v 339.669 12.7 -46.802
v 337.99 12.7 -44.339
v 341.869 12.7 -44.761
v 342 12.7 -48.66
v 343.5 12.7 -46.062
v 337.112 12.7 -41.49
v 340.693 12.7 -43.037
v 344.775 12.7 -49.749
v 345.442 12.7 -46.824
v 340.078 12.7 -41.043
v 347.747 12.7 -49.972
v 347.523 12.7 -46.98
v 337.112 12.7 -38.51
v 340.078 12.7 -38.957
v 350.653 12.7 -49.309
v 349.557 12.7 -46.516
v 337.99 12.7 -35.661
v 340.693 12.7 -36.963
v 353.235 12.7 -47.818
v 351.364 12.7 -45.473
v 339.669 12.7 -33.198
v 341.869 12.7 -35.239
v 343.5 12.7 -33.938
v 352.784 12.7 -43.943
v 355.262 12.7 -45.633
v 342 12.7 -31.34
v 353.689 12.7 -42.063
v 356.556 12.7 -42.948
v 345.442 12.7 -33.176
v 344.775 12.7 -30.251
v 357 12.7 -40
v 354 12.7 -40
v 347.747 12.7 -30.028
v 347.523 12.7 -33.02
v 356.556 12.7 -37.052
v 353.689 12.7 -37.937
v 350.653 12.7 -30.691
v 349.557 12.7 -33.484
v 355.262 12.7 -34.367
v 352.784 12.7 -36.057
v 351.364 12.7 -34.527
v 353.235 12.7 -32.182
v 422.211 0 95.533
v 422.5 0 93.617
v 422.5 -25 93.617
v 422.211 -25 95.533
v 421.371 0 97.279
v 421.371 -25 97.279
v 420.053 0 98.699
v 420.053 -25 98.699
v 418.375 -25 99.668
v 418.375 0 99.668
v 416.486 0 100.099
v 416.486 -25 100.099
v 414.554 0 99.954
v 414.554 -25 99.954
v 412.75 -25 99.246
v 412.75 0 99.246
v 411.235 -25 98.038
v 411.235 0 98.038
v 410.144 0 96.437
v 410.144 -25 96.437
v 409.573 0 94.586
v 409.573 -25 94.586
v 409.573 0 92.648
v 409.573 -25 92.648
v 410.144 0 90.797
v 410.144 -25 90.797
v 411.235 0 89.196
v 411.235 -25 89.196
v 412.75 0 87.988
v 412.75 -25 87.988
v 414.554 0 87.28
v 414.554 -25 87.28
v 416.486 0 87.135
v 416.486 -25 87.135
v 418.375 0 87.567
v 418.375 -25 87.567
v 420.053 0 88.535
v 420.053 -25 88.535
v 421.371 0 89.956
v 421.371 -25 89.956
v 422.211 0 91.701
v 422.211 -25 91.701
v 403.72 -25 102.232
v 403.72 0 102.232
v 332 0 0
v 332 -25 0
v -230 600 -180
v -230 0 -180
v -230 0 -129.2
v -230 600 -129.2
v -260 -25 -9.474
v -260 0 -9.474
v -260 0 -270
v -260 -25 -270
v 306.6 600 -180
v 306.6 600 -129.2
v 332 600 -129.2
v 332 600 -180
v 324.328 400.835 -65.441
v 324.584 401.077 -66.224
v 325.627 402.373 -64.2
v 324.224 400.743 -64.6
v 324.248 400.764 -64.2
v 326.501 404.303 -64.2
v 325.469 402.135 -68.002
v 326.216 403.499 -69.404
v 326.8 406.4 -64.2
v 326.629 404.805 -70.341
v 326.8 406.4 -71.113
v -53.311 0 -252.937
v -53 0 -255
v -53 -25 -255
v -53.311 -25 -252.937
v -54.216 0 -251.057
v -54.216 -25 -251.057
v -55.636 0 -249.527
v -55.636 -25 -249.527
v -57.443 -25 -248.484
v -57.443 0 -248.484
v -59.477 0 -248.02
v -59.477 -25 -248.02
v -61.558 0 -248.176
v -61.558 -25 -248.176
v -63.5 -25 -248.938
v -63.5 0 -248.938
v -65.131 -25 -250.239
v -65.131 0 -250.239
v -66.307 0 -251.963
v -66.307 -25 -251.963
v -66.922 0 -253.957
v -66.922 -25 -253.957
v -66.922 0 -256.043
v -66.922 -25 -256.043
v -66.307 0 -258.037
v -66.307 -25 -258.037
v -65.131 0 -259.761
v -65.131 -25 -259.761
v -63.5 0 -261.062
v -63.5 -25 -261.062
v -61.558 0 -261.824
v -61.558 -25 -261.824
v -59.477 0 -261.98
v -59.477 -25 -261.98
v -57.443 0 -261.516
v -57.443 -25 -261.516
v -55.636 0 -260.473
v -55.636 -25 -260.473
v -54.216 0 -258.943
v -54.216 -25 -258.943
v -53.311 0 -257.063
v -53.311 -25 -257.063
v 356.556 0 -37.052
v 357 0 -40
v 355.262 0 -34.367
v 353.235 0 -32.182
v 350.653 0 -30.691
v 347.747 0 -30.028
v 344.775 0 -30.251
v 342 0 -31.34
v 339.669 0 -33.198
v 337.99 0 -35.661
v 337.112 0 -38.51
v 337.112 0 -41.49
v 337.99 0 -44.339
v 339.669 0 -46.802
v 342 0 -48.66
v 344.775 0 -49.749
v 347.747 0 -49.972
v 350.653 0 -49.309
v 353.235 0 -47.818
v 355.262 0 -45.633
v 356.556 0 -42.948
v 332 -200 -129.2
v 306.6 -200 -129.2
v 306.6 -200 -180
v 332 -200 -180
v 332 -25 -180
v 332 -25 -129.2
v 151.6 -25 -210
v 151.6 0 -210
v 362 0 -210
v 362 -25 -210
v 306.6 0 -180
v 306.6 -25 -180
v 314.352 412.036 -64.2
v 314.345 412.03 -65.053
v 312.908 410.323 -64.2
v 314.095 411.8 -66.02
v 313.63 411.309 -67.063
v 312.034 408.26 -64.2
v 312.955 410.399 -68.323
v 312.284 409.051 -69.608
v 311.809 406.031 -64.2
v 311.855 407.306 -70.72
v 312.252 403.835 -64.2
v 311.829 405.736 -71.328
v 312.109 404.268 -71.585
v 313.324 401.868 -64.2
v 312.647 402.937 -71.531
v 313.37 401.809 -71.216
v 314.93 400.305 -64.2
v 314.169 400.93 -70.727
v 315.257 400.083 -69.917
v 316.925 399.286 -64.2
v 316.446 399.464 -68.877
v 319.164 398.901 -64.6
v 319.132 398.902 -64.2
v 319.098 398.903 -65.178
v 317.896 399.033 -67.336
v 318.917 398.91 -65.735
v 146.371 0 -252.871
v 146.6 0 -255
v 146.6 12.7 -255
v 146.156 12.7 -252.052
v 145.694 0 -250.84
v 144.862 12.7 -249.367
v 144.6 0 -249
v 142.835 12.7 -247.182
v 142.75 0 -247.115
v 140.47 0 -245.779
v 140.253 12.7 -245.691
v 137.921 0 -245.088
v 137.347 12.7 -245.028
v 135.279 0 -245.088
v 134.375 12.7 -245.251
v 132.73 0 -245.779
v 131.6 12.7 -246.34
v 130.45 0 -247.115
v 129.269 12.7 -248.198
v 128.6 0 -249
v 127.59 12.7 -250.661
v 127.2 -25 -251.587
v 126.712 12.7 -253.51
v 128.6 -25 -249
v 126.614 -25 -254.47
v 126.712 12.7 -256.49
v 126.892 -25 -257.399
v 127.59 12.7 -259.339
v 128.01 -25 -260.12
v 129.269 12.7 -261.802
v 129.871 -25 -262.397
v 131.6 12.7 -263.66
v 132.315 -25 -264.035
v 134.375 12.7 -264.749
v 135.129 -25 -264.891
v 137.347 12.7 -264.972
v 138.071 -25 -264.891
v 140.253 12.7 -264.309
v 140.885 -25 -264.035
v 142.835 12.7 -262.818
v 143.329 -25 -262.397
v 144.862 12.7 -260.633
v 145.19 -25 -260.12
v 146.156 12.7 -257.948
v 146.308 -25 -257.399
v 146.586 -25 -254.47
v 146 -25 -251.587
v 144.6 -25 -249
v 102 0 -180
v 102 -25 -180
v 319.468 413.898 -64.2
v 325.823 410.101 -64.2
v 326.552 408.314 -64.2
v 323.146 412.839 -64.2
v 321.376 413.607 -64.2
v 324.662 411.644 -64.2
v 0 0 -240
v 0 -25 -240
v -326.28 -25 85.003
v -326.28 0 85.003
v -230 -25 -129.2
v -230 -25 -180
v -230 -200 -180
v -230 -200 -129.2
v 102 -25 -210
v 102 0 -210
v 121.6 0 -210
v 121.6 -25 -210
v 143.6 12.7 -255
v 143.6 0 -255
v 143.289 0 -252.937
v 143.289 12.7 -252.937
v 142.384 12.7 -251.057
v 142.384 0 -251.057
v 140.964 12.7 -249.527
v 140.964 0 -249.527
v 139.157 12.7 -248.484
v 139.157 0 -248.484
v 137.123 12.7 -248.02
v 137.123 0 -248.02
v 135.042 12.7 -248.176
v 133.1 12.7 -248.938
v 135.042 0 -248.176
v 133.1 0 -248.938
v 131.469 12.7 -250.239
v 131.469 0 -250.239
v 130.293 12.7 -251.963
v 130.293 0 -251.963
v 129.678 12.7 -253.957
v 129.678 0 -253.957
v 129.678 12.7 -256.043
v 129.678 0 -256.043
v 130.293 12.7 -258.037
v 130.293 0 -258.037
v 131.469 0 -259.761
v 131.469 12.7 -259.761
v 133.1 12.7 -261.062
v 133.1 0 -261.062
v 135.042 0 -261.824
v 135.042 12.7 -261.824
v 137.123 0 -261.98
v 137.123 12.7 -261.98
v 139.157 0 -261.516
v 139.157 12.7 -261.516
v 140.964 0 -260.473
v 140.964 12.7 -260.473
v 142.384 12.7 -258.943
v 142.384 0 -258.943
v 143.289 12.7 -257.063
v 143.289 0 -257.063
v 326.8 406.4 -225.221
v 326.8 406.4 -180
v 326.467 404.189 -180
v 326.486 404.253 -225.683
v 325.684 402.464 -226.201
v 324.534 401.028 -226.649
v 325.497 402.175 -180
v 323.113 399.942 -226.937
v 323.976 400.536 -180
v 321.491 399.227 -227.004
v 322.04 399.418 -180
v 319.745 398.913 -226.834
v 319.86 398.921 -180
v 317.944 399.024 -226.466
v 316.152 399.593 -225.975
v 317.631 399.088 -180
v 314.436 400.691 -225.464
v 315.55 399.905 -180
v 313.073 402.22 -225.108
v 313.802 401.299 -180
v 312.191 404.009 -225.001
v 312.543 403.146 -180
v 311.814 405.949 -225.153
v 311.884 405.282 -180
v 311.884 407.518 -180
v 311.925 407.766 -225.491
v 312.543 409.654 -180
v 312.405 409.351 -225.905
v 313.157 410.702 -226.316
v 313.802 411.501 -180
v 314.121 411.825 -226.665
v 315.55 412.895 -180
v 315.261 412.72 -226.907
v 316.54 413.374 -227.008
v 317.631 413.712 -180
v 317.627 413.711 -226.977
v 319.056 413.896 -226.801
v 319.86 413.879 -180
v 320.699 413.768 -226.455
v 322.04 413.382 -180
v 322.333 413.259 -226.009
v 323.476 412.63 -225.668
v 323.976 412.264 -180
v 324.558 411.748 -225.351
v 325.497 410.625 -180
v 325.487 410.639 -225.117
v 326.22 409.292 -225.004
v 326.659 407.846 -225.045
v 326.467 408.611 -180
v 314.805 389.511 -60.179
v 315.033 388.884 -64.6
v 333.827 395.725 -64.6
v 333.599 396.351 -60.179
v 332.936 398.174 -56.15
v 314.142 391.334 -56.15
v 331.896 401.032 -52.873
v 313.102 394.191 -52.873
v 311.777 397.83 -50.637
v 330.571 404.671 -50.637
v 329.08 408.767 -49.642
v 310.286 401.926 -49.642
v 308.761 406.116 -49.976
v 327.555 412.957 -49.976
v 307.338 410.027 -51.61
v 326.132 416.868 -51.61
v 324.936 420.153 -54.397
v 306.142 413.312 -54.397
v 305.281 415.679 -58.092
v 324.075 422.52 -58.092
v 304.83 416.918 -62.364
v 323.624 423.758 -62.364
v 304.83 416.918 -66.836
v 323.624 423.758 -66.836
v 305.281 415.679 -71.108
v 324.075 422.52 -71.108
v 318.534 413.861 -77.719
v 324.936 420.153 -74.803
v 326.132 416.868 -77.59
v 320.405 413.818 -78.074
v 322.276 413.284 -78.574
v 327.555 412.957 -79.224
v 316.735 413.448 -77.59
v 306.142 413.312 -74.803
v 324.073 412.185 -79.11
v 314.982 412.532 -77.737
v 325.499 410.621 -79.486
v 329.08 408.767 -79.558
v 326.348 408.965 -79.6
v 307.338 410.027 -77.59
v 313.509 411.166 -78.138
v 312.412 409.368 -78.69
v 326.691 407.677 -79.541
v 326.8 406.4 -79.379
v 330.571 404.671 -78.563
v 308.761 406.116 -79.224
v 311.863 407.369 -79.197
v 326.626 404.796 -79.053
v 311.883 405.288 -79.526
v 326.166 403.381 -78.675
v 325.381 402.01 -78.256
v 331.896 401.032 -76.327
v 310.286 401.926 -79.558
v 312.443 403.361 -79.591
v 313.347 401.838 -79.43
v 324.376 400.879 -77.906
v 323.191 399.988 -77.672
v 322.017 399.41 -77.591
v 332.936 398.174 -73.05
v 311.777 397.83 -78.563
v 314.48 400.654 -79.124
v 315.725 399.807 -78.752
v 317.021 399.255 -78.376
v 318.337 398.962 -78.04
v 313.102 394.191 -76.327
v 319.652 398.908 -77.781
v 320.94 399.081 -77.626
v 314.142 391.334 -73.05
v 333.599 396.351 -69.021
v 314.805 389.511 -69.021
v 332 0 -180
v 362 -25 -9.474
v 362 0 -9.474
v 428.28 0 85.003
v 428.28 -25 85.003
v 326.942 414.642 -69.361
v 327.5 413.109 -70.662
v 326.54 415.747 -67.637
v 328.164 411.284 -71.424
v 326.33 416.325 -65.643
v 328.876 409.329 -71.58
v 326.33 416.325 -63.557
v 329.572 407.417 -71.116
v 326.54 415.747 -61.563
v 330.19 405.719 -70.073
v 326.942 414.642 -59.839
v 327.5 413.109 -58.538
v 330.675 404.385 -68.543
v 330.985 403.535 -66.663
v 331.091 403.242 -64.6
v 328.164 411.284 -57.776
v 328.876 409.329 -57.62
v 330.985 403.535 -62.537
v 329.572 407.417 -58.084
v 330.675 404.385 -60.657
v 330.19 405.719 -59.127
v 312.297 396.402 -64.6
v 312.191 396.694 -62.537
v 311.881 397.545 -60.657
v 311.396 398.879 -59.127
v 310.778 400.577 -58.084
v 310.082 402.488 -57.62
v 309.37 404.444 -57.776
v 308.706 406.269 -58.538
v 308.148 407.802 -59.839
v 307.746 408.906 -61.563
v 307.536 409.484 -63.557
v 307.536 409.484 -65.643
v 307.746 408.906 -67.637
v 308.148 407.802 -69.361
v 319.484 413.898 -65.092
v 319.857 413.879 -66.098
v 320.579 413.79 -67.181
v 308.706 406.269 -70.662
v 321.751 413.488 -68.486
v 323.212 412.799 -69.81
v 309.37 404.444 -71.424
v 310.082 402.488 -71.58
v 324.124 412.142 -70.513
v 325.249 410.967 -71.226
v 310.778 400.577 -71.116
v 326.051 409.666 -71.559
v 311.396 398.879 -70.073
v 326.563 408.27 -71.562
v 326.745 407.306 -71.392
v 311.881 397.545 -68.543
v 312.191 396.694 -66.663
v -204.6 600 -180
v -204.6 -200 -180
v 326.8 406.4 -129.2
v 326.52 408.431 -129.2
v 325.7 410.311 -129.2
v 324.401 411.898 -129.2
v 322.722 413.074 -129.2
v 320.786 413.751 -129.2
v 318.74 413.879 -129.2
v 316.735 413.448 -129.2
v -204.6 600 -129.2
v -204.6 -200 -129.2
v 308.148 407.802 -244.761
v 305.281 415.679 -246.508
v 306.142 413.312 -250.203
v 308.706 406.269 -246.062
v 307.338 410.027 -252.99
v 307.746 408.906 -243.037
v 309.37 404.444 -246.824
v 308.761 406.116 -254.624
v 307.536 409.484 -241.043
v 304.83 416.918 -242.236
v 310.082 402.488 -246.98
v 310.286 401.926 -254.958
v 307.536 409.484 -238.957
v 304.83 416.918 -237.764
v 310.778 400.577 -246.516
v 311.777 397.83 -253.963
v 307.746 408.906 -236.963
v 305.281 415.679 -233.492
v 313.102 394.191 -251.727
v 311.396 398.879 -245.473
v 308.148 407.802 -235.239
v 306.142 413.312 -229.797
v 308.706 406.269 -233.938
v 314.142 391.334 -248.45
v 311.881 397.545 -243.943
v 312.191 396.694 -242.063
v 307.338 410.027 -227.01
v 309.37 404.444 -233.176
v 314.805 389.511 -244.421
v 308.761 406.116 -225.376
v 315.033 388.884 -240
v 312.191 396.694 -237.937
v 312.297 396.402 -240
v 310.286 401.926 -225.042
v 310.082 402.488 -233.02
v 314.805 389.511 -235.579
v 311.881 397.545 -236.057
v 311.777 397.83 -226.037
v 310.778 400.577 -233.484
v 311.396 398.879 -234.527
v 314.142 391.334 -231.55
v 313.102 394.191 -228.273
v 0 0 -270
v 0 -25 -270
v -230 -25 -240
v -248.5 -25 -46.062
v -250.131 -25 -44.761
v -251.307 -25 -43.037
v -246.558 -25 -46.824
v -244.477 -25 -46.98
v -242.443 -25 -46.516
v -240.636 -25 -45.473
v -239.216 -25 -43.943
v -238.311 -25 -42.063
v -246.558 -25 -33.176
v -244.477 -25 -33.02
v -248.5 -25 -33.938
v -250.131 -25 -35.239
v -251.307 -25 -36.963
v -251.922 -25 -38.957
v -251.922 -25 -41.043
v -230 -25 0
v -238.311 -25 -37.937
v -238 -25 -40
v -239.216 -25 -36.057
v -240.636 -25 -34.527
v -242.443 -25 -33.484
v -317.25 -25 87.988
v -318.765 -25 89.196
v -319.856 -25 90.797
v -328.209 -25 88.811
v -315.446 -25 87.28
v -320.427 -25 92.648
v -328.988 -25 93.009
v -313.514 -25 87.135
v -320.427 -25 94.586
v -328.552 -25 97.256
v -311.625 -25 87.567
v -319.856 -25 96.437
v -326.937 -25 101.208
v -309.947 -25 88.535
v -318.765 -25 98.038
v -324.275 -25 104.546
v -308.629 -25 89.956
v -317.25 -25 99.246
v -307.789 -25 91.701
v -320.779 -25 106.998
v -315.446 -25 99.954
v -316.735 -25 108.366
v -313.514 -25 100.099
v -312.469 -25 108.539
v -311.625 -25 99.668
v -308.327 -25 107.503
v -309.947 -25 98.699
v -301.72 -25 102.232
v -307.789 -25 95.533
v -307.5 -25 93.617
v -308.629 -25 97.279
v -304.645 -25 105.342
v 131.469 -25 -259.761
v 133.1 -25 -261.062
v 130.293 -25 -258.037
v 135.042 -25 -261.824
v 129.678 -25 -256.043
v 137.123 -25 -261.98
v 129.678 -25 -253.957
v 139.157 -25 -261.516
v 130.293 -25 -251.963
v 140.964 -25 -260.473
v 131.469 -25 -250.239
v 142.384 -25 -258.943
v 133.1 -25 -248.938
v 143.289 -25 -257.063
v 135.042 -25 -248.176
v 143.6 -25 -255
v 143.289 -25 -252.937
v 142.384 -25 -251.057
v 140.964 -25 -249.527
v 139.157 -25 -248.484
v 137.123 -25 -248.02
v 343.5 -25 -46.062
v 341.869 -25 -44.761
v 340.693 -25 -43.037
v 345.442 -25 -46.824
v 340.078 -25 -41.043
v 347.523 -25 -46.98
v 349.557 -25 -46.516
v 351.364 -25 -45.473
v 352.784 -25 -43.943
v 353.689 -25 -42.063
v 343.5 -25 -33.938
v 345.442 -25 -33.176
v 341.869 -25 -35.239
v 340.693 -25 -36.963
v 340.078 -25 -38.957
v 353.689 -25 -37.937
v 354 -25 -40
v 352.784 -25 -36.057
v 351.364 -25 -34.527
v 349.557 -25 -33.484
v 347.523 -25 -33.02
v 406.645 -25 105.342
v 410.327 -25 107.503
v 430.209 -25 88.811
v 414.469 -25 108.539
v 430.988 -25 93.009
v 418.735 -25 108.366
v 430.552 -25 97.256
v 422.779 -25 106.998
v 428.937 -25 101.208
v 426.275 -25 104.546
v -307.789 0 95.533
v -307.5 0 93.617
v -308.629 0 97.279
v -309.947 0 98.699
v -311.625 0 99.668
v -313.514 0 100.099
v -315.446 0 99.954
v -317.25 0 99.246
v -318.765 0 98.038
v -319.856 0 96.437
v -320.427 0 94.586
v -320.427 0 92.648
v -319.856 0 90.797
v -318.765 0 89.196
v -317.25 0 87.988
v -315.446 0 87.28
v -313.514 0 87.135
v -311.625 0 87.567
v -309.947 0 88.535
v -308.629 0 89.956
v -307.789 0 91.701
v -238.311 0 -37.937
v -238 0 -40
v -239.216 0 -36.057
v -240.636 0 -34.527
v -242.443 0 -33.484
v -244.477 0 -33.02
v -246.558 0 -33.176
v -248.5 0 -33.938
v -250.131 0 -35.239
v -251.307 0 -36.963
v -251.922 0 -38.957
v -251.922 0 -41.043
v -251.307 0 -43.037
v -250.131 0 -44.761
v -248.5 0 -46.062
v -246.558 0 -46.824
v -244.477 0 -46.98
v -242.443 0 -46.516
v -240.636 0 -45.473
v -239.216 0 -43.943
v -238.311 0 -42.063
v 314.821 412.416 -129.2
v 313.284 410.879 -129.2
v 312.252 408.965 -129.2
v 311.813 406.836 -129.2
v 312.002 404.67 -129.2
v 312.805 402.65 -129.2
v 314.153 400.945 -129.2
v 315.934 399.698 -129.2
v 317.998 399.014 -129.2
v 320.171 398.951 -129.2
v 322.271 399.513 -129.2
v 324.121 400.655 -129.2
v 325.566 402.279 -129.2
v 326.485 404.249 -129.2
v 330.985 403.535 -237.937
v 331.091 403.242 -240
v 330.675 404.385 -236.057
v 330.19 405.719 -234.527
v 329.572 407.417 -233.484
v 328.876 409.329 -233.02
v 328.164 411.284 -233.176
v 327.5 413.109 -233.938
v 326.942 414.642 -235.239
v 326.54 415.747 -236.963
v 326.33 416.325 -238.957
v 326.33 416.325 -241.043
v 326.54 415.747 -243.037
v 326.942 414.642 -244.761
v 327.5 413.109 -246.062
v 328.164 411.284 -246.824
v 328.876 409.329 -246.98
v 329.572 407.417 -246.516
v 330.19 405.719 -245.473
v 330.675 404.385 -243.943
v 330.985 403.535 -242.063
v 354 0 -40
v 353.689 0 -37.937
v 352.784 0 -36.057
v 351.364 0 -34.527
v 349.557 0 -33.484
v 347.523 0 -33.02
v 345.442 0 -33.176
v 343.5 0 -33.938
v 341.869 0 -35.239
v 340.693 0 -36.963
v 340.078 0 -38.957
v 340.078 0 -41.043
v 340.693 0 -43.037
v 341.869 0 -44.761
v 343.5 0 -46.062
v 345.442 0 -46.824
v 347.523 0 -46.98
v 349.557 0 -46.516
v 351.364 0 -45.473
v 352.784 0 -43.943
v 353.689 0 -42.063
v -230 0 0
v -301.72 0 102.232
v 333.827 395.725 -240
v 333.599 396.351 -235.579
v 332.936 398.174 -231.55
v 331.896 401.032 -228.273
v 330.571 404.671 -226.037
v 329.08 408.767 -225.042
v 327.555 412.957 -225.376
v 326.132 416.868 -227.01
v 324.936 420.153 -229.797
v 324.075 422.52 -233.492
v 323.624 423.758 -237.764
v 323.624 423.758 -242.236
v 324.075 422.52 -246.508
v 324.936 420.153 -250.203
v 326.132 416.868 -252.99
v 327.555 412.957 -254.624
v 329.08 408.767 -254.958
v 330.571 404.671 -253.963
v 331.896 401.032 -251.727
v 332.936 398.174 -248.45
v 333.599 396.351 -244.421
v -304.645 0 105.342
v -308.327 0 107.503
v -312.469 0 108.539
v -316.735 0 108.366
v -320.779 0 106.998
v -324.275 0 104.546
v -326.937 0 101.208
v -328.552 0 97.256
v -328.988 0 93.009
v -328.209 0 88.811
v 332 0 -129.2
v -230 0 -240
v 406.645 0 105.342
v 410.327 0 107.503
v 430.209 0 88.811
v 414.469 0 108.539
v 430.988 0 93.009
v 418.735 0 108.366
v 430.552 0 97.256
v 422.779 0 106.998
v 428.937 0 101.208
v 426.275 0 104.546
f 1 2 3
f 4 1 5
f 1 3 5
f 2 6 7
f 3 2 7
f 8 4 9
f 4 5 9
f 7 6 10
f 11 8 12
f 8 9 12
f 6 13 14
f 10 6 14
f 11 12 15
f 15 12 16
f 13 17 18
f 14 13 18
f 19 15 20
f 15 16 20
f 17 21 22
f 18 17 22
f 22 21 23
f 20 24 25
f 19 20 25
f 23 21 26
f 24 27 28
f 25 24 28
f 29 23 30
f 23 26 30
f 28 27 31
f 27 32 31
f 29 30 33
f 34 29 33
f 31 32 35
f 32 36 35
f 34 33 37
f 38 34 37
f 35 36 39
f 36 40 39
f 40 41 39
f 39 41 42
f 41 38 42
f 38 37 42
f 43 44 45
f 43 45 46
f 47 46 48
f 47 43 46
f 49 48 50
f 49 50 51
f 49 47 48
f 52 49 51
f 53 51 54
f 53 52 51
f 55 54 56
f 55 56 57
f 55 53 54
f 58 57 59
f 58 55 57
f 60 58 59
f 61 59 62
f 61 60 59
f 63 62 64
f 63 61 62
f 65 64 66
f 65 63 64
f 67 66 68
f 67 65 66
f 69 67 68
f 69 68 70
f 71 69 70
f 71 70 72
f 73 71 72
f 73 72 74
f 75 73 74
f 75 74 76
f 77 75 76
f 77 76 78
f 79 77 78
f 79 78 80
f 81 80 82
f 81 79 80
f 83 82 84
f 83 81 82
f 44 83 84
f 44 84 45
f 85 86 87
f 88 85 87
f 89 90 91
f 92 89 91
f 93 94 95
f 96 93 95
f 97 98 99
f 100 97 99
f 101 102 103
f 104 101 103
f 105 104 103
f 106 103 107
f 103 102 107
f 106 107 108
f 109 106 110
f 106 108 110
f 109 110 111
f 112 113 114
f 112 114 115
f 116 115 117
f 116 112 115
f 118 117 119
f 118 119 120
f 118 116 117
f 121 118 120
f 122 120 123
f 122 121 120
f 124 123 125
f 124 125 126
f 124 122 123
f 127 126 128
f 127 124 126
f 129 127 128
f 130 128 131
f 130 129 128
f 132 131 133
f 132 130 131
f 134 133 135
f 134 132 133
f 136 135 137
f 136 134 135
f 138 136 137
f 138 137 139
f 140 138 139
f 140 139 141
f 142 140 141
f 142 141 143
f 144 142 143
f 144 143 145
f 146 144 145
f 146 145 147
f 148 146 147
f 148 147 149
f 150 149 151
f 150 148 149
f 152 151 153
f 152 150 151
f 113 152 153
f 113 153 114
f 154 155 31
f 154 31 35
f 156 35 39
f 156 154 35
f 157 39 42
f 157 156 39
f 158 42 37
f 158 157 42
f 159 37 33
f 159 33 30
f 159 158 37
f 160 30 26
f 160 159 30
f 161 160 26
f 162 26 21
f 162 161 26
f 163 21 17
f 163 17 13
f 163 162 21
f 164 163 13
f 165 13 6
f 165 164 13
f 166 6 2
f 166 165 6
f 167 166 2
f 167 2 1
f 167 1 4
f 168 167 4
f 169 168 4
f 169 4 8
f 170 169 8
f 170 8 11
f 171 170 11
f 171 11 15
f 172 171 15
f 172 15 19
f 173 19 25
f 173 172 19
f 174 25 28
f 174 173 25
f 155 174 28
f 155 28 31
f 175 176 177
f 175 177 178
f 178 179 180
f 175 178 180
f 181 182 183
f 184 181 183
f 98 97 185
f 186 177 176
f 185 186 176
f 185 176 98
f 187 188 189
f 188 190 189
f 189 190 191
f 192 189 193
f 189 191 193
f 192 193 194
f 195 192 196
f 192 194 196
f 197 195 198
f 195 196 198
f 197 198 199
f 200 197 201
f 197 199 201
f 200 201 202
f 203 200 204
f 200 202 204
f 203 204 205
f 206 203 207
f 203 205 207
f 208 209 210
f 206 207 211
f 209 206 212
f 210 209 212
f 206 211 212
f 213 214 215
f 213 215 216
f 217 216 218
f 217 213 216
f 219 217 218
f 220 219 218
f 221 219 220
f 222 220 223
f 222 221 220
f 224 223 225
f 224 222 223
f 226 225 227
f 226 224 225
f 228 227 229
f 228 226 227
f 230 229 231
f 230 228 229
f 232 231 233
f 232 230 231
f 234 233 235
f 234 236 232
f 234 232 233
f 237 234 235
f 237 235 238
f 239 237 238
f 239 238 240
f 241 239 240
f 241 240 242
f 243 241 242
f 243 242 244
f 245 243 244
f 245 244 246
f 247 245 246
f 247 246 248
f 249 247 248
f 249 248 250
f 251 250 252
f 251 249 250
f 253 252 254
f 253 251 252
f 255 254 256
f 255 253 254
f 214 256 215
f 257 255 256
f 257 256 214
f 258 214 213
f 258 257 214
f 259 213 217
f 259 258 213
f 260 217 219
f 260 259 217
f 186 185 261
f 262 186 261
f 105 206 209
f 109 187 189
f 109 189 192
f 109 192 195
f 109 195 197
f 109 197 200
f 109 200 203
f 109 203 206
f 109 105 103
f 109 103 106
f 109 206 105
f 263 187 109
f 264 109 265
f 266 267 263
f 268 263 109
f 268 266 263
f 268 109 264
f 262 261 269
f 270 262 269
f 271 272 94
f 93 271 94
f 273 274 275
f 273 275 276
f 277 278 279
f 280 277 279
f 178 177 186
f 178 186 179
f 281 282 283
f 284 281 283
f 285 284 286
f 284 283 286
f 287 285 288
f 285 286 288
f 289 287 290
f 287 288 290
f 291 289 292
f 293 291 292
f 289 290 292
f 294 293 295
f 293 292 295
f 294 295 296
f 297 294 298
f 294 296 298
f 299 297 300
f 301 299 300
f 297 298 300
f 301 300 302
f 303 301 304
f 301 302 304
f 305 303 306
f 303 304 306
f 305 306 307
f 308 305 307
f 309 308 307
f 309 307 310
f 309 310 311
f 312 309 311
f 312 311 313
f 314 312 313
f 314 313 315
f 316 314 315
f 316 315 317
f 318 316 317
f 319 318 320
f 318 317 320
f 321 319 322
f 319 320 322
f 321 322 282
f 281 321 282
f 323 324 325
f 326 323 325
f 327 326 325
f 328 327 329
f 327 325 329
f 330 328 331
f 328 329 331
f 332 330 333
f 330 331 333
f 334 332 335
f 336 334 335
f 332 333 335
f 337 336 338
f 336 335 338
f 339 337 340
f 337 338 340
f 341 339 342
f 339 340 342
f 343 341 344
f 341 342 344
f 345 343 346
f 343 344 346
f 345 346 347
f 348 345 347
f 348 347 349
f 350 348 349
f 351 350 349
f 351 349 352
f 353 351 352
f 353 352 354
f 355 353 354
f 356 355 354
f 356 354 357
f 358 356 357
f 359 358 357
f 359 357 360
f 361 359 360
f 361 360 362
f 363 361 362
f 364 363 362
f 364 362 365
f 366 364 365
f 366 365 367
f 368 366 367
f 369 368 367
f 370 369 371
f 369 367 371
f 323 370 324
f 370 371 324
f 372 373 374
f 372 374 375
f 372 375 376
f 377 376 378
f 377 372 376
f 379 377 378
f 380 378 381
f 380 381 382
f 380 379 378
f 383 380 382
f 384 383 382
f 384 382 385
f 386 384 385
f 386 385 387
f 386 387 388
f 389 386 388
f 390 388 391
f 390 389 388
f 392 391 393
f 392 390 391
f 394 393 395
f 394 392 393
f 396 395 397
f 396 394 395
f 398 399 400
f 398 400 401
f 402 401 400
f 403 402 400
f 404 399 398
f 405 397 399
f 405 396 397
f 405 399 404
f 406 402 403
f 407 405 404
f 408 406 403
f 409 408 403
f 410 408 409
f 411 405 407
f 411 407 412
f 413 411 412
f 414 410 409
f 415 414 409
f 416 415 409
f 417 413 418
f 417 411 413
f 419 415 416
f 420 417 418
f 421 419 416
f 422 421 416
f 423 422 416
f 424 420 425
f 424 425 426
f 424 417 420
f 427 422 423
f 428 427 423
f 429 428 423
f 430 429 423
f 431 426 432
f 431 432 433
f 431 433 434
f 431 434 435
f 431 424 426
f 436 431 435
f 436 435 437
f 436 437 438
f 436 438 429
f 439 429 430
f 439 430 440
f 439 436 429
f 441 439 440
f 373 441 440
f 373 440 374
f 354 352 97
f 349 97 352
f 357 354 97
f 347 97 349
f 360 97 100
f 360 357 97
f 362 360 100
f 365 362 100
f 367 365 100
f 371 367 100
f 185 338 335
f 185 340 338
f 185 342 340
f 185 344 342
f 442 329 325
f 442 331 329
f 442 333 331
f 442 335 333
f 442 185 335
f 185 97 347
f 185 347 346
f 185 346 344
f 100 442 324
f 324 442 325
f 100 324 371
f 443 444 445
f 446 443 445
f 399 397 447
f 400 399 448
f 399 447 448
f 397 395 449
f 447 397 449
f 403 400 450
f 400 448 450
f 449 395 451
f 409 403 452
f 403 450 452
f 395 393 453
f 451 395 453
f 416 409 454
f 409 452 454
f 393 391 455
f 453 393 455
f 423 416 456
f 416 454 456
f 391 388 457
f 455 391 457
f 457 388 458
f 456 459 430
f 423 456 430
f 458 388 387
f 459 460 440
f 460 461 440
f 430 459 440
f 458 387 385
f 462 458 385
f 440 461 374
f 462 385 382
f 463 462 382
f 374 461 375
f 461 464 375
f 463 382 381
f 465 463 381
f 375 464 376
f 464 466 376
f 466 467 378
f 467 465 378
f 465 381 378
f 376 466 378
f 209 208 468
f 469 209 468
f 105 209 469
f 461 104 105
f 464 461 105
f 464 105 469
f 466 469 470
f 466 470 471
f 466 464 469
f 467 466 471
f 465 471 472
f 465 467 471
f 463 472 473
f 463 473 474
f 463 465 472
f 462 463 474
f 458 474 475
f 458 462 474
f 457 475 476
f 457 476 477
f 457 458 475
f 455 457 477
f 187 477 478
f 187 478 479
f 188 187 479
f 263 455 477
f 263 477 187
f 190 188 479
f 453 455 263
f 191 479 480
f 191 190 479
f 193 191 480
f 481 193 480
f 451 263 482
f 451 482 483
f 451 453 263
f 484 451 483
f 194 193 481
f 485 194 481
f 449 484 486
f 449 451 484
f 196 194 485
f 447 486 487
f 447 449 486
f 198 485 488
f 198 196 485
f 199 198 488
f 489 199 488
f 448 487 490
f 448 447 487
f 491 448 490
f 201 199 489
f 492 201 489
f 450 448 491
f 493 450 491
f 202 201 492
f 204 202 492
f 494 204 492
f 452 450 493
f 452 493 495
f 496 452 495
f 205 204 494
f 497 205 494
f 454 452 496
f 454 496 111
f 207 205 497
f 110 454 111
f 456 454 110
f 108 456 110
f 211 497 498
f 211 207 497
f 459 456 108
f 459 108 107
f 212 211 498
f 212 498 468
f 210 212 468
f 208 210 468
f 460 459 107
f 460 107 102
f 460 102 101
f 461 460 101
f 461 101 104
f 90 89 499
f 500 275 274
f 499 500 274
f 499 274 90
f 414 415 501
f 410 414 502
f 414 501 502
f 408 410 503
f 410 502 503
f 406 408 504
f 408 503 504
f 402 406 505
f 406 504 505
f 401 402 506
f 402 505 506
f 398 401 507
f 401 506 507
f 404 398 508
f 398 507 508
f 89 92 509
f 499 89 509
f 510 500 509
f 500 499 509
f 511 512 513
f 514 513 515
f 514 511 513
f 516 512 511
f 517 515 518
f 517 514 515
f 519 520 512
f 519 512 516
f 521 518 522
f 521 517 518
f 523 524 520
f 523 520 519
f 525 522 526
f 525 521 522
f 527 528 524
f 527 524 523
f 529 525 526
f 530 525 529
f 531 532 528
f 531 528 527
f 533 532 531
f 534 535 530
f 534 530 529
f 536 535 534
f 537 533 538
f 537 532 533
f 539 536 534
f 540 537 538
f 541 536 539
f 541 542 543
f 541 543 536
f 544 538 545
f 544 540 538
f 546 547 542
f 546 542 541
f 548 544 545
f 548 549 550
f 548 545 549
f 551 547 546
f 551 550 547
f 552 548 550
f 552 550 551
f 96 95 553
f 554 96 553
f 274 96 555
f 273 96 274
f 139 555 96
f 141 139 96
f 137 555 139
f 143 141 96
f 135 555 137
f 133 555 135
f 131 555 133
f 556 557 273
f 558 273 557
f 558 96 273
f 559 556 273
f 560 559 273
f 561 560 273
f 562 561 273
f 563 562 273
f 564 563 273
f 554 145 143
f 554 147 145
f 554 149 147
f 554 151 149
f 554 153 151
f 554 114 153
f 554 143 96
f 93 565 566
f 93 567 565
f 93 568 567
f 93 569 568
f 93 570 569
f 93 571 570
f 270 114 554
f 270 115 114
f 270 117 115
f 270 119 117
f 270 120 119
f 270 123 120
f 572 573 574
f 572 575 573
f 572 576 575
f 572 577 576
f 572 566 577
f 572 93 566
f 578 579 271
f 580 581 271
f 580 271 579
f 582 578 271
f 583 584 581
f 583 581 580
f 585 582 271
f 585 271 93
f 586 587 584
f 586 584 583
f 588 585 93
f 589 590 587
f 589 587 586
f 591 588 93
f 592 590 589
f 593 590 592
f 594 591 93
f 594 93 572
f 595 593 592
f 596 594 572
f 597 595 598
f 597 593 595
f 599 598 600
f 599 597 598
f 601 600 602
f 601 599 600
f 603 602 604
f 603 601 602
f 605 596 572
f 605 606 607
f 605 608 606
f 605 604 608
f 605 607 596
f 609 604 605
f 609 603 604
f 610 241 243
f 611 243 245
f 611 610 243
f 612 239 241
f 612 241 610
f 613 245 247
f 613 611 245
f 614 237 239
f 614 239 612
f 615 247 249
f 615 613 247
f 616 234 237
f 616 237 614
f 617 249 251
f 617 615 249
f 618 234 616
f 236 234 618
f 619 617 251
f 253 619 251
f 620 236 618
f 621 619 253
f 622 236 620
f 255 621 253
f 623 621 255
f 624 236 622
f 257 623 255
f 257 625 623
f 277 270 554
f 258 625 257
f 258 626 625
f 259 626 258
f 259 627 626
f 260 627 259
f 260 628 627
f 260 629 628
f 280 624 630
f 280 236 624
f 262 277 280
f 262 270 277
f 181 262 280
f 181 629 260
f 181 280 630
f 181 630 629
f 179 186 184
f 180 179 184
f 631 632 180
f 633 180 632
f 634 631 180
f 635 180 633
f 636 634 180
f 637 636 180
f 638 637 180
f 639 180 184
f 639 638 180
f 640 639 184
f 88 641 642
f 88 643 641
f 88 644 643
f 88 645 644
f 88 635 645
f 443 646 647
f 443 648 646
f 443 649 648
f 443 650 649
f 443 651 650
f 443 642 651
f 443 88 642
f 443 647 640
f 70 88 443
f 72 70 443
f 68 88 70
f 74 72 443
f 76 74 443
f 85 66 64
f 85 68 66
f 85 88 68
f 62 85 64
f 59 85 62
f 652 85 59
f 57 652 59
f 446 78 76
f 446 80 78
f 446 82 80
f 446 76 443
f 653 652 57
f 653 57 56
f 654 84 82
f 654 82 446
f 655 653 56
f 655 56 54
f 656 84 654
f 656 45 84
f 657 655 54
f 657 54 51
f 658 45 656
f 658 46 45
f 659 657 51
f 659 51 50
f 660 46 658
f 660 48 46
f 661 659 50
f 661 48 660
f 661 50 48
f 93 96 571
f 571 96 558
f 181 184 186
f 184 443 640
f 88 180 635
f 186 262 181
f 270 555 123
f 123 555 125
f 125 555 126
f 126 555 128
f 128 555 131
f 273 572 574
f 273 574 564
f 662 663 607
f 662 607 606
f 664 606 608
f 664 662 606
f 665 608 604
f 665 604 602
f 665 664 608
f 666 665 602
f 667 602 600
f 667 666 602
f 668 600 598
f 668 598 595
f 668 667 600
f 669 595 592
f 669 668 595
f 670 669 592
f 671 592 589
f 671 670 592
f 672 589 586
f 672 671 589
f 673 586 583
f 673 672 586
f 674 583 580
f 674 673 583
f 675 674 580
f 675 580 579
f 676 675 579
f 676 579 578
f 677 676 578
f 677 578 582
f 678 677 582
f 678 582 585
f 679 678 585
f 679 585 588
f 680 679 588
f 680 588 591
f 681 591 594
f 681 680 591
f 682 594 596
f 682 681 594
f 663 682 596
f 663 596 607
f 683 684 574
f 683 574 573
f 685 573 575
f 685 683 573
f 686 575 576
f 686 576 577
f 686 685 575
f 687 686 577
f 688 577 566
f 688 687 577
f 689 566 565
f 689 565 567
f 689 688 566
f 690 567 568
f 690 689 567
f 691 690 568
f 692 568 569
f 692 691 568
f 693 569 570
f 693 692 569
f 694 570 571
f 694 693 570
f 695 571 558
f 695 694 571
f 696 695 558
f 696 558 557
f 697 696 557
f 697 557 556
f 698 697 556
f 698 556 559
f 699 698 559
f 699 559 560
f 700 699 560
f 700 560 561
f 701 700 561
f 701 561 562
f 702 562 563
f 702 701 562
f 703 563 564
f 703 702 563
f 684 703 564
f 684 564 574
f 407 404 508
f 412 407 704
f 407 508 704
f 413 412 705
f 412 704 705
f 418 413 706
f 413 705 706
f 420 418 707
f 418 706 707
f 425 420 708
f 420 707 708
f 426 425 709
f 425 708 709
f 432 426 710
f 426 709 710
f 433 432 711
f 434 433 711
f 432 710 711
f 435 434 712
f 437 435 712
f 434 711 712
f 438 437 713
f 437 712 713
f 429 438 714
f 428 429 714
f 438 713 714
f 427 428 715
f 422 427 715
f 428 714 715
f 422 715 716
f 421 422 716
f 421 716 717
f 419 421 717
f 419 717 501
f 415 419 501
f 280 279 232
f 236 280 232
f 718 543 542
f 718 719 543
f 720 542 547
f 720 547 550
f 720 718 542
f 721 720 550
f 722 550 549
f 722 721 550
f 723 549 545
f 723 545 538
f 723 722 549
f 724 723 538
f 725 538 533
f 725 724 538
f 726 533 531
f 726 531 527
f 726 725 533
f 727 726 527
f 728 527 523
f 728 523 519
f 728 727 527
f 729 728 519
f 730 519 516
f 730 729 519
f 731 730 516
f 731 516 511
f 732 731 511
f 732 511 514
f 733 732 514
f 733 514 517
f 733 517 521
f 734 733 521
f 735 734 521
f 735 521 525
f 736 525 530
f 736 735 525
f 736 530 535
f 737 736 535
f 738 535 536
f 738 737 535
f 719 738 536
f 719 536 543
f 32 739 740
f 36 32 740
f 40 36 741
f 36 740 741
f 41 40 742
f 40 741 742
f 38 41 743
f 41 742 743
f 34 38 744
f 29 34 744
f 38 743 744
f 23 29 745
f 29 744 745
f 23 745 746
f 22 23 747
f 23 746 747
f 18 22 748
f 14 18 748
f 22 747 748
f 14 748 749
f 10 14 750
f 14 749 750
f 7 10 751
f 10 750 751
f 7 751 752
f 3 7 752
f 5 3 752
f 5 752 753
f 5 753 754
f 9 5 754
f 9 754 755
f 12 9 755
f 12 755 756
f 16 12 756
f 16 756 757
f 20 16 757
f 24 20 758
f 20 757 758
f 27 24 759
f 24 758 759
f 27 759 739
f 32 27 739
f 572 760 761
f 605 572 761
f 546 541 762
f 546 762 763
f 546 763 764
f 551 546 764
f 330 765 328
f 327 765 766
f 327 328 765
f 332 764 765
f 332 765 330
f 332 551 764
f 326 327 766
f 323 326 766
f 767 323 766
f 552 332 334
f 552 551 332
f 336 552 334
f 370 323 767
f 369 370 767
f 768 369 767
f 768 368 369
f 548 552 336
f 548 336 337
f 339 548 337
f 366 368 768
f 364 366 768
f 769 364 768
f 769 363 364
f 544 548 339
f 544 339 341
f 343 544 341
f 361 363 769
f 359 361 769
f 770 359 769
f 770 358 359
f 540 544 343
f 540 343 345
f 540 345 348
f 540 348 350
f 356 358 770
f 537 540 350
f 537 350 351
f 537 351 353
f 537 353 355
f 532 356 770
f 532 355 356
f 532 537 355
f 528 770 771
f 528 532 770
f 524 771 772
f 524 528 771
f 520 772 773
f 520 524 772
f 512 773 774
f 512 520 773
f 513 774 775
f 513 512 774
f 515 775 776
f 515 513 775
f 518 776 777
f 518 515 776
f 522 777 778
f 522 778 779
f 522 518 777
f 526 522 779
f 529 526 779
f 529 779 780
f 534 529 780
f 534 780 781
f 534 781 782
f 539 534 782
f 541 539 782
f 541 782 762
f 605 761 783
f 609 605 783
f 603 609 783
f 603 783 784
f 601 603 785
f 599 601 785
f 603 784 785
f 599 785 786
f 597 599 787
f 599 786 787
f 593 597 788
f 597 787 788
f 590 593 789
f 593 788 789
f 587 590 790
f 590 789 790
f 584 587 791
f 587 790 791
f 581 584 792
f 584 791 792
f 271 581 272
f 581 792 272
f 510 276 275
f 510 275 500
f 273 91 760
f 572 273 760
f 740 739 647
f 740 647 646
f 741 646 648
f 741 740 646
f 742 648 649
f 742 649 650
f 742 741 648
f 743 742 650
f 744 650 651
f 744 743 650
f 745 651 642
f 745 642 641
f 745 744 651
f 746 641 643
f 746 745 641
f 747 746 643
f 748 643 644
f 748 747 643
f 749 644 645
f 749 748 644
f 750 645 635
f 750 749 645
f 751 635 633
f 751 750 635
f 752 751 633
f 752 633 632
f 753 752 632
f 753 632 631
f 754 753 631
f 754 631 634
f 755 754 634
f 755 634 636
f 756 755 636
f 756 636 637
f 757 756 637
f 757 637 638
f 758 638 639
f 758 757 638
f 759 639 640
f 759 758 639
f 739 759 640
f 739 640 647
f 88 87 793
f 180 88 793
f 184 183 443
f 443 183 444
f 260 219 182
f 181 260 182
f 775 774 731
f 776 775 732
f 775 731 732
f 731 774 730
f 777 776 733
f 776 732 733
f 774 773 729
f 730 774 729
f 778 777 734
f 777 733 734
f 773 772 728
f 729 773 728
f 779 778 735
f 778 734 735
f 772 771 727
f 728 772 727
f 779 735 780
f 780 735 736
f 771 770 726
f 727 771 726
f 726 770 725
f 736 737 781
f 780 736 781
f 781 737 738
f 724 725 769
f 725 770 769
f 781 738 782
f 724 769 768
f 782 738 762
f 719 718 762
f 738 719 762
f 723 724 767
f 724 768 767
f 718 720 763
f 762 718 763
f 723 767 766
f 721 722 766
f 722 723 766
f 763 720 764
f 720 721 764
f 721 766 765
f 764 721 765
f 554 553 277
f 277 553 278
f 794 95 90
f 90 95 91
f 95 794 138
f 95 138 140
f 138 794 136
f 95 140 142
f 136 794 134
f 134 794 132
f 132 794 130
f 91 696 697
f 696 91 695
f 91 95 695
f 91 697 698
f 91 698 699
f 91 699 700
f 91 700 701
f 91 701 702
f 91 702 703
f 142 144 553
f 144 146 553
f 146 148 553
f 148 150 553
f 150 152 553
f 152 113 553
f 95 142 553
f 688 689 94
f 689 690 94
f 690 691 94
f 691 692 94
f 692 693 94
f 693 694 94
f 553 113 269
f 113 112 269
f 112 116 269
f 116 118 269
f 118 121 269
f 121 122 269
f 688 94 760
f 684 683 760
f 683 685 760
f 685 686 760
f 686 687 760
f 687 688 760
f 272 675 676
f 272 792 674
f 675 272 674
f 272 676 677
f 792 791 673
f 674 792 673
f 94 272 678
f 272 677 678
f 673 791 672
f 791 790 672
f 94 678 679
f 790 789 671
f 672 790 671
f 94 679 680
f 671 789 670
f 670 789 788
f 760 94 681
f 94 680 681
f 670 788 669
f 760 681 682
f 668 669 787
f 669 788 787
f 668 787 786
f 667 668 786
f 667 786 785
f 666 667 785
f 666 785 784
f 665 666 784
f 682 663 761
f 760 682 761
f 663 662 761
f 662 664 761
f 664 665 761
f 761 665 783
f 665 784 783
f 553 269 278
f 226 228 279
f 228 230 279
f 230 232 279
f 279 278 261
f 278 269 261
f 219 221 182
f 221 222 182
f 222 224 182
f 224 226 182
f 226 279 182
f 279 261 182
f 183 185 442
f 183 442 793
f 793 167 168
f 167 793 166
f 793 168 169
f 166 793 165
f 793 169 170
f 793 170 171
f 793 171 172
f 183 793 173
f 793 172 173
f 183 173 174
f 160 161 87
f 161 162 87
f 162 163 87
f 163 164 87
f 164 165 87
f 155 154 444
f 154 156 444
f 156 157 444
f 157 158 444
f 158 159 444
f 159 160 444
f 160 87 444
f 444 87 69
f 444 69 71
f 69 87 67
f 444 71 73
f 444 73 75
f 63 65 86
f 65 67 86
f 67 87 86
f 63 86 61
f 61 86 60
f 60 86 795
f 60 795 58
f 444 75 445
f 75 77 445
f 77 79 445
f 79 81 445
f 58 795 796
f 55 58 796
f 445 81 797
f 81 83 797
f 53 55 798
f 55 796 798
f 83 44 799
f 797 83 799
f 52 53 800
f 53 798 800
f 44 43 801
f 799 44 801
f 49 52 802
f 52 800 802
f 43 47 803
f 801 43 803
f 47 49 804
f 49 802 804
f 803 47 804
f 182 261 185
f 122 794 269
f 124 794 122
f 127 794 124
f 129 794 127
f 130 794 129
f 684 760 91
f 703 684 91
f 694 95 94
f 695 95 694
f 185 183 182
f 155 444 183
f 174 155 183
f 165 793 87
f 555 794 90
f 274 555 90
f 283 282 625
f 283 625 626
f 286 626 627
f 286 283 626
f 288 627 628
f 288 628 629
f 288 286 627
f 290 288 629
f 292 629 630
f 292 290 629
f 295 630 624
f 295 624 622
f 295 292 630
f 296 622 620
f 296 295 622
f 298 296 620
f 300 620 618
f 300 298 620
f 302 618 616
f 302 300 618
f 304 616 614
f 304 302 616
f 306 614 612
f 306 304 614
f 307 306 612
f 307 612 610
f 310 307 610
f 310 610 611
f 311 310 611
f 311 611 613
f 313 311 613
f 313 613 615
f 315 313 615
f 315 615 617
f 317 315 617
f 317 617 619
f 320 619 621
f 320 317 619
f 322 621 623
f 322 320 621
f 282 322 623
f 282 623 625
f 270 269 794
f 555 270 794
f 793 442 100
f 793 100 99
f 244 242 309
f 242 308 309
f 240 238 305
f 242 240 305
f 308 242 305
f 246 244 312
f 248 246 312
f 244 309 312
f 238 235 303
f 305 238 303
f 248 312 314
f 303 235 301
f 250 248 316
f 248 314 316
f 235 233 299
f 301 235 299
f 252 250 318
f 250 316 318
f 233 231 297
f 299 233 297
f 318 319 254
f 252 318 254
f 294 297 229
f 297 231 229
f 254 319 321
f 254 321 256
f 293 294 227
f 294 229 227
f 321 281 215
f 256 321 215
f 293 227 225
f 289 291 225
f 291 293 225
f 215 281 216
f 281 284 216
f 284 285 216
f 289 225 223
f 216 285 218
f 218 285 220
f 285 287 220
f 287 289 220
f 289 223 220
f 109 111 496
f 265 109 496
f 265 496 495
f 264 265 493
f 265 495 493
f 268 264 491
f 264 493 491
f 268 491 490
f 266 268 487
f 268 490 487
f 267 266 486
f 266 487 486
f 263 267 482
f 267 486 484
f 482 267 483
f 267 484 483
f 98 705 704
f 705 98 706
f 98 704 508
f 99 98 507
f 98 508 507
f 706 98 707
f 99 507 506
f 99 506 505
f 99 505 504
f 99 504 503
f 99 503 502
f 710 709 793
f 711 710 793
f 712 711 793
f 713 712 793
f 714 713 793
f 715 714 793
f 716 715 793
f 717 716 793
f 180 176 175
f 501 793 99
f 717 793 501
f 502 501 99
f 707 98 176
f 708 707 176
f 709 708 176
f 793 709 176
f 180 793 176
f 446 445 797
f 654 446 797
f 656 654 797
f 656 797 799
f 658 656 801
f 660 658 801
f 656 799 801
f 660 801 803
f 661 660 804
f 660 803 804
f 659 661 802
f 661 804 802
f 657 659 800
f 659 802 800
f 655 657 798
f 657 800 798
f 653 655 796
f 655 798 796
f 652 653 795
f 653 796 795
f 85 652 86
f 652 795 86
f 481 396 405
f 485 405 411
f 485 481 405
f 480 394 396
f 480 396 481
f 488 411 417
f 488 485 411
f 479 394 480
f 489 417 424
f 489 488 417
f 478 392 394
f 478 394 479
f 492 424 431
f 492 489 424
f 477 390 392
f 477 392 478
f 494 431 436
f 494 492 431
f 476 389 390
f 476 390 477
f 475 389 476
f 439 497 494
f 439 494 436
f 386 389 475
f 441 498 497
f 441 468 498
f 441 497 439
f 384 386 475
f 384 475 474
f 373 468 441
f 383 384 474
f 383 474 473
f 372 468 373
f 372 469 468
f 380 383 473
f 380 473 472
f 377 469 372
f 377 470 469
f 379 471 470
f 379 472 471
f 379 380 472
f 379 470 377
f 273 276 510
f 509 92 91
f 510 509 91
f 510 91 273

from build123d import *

# Parameters (mm, degrees)
F0_R          = 7
F0_R_2        = 6.5
F1_DEPTH      = 25
F2_W          = 25.4
F2_H          = 50.8
F3_DEPTH      = 200
F3_DEPTH_BACK = 600
F6_DEPTH      = 65
F8_R          = 15
F8_R_2        = 7
F9_DEPTH      = 10
F10_R         = 15
F10_R_2       = 7
F11_DEPTH     = 10
F12_R         = 7.5
F13_REACH     = 111.2142034356
F14_R         = 10
F14_R_2       = 7
F15_DEPTH     = 12.7
F16_R         = 10
F16_R_2       = 7
F17_DEPTH     = 12.7


with BuildPart() as f1:
    # F0 (on Front) → F1 (new body)
    with BuildSketch(Plane.XZ):
        with BuildLine():
            Line((-230, 0), (-301.7204504189, 102.2319018363))
            ThreePointArc((-301.7204504189, 102.2319018363), (-322.6146771319, 105.8967742855), (-326.2795495811, 85.0025475726))
            Line((-326.2795495811, 85.0025475726), (-260, -9.4737749679))
            Line((-260, -9.4737749679), (-260, -270))
            Line((-260, -270), (0, -270))
            Line((0, -270), (102, -210))
            Line((102, -210), (121.6, -210))
            Line((121.6, -210), (128.6, -249))
            ThreePointArc((128.6, -249), (136.6, -265), (144.6, -249))
            Line((144.6, -249), (151.6, -210))
            Line((151.6, -210), (362, -210))
            Line((362, -210), (362, -9.4737749679))
            Line((362, -9.4737749679), (428.2795495811, 85.0025475726))
            ThreePointArc((428.2795495811, 85.0025475726), (424.6146771319, 105.8967742855), (403.7204504189, 102.2319018363))
            Line((403.7204504189, 102.2319018363), (332, 0))
            Line((332, 0), (332, -129.2))
            Line((332, -129.2), (332, -180))
            Line((332, -180), (306.6, -180))
            Line((306.6, -180), (102, -180))
            Line((102, -180), (0, -240))
            Line((0, -240), (-230, -240))
            Line((-230, -240), (-230, 0))
        make_face()
        with Locations((-60, -255)):
            Circle(F0_R, mode=Mode.SUBTRACT)
        with Locations((136.6, -255)):
            Circle(F0_R, mode=Mode.SUBTRACT)
        with Locations((-245, -40)):
            Circle(F0_R, mode=Mode.SUBTRACT)
        with Locations((-314, 93.6172247045)):
            Circle(F0_R_2, mode=Mode.SUBTRACT)
        with Locations((347, -40)):
            Circle(F0_R, mode=Mode.SUBTRACT)
        with Locations((416, 93.6172247045)):
            Circle(F0_R_2, mode=Mode.SUBTRACT)
    extrude(amount=F1_DEPTH)

    # F2 (on Front) → F3 (join, two sides)
    with BuildSketch(Plane.XZ) as f3_sk:
        with Locations((319.3, -154.6)):
            Rectangle(F2_W, F2_H)
        with Locations((-217.3, -154.6)):
            Rectangle(F2_W, F2_H)
    extrude(amount=F3_DEPTH)
    extrude(f3_sk.sketch, amount=-F3_DEPTH_BACK)

    # F5 (on face) → F6 (join)
    with BuildSketch(Plane.XY.offset(-129.2)):
        with BuildLine():
            ThreePointArc((316.7348489251, 413.4476946559), (314.9981767274, 400.2563596678), (326.8, 406.4))
            ThreePointArc((326.8, 406.4), (323.6018232726, 412.5436403322), (316.7348489251, 413.4476946559))
        make_face()
    extrude(amount=F6_DEPTH)

    # F8 (on face) → F9 (join, symmetric)
    with BuildSketch(Plane(origin=(412.5634376322, 150.1608110447, 0), x_dir=(0.3420201433, -0.9396926208, 0), z_dir=(-0.9396926208, -0.3420201433, 0))):
        with Locations((-272.6840493235, -64.6)):
            Circle(F8_R)
        with Locations((-272.6840493235, -64.6)):
            Circle(F8_R_2, mode=Mode.SUBTRACT)
    extrude(amount=F9_DEPTH, both=True)



with BuildPart() as f11:
    # F10 (on face) → F11 (new body, symmetric)
    with BuildSketch(Plane(origin=(412.5634376322, 150.1608110447, 0), x_dir=(0.3420201433, -0.9396926208, 0), z_dir=(-0.9396926208, -0.3420201433, 0))):
        with Locations((-272.6840493235, -240)):
            Circle(F10_R)
        with Locations((-272.6840493235, -240)):
            Circle(F10_R_2, mode=Mode.SUBTRACT)
    extrude(amount=F11_DEPTH, both=True)


with BuildPart() as f1_1:
    add(f1.part)

    add(f11.part)  # F13 merges F11
    f13_end = f1_1.faces().sort_by_distance((314.1696978501, 420.4953893118, -240))[0]
    # F12 (on face) → F13 (join, up to a face of the model that its end follows)
    with BuildSketch(Plane(origin=(0, 0, -180), x_dir=(1, 0, 0), z_dir=(0, 0, -1))):
        with Locations((319.3, -406.4)):
            Circle(F12_R)
    f13_long = extrude(amount=F13_REACH, mode=Mode.PRIVATE)
    add(split(f13_long, bisect_by=f13_end, keep=Keep.ALL, mode=Mode.PRIVATE).solids().sort_by_distance((319.3, 406.4, -180))[0])

    # F14 (on face) → F15 (join)
    with BuildSketch(Plane.XZ):
        with Locations((136.6, -255)):
            Circle(F14_R)
        with Locations((136.6, -255)):
            Circle(F14_R_2, mode=Mode.SUBTRACT)
    extrude(amount=-F15_DEPTH)

    # F16 (on face) → F17 (join)
    with BuildSketch(Plane.XZ):
        with Locations((347, -40)):
            Circle(F16_R)
        with Locations((347, -40)):
            Circle(F16_R_2, mode=Mode.SUBTRACT)
    extrude(amount=-F17_DEPTH)


solid = f1_1.part
